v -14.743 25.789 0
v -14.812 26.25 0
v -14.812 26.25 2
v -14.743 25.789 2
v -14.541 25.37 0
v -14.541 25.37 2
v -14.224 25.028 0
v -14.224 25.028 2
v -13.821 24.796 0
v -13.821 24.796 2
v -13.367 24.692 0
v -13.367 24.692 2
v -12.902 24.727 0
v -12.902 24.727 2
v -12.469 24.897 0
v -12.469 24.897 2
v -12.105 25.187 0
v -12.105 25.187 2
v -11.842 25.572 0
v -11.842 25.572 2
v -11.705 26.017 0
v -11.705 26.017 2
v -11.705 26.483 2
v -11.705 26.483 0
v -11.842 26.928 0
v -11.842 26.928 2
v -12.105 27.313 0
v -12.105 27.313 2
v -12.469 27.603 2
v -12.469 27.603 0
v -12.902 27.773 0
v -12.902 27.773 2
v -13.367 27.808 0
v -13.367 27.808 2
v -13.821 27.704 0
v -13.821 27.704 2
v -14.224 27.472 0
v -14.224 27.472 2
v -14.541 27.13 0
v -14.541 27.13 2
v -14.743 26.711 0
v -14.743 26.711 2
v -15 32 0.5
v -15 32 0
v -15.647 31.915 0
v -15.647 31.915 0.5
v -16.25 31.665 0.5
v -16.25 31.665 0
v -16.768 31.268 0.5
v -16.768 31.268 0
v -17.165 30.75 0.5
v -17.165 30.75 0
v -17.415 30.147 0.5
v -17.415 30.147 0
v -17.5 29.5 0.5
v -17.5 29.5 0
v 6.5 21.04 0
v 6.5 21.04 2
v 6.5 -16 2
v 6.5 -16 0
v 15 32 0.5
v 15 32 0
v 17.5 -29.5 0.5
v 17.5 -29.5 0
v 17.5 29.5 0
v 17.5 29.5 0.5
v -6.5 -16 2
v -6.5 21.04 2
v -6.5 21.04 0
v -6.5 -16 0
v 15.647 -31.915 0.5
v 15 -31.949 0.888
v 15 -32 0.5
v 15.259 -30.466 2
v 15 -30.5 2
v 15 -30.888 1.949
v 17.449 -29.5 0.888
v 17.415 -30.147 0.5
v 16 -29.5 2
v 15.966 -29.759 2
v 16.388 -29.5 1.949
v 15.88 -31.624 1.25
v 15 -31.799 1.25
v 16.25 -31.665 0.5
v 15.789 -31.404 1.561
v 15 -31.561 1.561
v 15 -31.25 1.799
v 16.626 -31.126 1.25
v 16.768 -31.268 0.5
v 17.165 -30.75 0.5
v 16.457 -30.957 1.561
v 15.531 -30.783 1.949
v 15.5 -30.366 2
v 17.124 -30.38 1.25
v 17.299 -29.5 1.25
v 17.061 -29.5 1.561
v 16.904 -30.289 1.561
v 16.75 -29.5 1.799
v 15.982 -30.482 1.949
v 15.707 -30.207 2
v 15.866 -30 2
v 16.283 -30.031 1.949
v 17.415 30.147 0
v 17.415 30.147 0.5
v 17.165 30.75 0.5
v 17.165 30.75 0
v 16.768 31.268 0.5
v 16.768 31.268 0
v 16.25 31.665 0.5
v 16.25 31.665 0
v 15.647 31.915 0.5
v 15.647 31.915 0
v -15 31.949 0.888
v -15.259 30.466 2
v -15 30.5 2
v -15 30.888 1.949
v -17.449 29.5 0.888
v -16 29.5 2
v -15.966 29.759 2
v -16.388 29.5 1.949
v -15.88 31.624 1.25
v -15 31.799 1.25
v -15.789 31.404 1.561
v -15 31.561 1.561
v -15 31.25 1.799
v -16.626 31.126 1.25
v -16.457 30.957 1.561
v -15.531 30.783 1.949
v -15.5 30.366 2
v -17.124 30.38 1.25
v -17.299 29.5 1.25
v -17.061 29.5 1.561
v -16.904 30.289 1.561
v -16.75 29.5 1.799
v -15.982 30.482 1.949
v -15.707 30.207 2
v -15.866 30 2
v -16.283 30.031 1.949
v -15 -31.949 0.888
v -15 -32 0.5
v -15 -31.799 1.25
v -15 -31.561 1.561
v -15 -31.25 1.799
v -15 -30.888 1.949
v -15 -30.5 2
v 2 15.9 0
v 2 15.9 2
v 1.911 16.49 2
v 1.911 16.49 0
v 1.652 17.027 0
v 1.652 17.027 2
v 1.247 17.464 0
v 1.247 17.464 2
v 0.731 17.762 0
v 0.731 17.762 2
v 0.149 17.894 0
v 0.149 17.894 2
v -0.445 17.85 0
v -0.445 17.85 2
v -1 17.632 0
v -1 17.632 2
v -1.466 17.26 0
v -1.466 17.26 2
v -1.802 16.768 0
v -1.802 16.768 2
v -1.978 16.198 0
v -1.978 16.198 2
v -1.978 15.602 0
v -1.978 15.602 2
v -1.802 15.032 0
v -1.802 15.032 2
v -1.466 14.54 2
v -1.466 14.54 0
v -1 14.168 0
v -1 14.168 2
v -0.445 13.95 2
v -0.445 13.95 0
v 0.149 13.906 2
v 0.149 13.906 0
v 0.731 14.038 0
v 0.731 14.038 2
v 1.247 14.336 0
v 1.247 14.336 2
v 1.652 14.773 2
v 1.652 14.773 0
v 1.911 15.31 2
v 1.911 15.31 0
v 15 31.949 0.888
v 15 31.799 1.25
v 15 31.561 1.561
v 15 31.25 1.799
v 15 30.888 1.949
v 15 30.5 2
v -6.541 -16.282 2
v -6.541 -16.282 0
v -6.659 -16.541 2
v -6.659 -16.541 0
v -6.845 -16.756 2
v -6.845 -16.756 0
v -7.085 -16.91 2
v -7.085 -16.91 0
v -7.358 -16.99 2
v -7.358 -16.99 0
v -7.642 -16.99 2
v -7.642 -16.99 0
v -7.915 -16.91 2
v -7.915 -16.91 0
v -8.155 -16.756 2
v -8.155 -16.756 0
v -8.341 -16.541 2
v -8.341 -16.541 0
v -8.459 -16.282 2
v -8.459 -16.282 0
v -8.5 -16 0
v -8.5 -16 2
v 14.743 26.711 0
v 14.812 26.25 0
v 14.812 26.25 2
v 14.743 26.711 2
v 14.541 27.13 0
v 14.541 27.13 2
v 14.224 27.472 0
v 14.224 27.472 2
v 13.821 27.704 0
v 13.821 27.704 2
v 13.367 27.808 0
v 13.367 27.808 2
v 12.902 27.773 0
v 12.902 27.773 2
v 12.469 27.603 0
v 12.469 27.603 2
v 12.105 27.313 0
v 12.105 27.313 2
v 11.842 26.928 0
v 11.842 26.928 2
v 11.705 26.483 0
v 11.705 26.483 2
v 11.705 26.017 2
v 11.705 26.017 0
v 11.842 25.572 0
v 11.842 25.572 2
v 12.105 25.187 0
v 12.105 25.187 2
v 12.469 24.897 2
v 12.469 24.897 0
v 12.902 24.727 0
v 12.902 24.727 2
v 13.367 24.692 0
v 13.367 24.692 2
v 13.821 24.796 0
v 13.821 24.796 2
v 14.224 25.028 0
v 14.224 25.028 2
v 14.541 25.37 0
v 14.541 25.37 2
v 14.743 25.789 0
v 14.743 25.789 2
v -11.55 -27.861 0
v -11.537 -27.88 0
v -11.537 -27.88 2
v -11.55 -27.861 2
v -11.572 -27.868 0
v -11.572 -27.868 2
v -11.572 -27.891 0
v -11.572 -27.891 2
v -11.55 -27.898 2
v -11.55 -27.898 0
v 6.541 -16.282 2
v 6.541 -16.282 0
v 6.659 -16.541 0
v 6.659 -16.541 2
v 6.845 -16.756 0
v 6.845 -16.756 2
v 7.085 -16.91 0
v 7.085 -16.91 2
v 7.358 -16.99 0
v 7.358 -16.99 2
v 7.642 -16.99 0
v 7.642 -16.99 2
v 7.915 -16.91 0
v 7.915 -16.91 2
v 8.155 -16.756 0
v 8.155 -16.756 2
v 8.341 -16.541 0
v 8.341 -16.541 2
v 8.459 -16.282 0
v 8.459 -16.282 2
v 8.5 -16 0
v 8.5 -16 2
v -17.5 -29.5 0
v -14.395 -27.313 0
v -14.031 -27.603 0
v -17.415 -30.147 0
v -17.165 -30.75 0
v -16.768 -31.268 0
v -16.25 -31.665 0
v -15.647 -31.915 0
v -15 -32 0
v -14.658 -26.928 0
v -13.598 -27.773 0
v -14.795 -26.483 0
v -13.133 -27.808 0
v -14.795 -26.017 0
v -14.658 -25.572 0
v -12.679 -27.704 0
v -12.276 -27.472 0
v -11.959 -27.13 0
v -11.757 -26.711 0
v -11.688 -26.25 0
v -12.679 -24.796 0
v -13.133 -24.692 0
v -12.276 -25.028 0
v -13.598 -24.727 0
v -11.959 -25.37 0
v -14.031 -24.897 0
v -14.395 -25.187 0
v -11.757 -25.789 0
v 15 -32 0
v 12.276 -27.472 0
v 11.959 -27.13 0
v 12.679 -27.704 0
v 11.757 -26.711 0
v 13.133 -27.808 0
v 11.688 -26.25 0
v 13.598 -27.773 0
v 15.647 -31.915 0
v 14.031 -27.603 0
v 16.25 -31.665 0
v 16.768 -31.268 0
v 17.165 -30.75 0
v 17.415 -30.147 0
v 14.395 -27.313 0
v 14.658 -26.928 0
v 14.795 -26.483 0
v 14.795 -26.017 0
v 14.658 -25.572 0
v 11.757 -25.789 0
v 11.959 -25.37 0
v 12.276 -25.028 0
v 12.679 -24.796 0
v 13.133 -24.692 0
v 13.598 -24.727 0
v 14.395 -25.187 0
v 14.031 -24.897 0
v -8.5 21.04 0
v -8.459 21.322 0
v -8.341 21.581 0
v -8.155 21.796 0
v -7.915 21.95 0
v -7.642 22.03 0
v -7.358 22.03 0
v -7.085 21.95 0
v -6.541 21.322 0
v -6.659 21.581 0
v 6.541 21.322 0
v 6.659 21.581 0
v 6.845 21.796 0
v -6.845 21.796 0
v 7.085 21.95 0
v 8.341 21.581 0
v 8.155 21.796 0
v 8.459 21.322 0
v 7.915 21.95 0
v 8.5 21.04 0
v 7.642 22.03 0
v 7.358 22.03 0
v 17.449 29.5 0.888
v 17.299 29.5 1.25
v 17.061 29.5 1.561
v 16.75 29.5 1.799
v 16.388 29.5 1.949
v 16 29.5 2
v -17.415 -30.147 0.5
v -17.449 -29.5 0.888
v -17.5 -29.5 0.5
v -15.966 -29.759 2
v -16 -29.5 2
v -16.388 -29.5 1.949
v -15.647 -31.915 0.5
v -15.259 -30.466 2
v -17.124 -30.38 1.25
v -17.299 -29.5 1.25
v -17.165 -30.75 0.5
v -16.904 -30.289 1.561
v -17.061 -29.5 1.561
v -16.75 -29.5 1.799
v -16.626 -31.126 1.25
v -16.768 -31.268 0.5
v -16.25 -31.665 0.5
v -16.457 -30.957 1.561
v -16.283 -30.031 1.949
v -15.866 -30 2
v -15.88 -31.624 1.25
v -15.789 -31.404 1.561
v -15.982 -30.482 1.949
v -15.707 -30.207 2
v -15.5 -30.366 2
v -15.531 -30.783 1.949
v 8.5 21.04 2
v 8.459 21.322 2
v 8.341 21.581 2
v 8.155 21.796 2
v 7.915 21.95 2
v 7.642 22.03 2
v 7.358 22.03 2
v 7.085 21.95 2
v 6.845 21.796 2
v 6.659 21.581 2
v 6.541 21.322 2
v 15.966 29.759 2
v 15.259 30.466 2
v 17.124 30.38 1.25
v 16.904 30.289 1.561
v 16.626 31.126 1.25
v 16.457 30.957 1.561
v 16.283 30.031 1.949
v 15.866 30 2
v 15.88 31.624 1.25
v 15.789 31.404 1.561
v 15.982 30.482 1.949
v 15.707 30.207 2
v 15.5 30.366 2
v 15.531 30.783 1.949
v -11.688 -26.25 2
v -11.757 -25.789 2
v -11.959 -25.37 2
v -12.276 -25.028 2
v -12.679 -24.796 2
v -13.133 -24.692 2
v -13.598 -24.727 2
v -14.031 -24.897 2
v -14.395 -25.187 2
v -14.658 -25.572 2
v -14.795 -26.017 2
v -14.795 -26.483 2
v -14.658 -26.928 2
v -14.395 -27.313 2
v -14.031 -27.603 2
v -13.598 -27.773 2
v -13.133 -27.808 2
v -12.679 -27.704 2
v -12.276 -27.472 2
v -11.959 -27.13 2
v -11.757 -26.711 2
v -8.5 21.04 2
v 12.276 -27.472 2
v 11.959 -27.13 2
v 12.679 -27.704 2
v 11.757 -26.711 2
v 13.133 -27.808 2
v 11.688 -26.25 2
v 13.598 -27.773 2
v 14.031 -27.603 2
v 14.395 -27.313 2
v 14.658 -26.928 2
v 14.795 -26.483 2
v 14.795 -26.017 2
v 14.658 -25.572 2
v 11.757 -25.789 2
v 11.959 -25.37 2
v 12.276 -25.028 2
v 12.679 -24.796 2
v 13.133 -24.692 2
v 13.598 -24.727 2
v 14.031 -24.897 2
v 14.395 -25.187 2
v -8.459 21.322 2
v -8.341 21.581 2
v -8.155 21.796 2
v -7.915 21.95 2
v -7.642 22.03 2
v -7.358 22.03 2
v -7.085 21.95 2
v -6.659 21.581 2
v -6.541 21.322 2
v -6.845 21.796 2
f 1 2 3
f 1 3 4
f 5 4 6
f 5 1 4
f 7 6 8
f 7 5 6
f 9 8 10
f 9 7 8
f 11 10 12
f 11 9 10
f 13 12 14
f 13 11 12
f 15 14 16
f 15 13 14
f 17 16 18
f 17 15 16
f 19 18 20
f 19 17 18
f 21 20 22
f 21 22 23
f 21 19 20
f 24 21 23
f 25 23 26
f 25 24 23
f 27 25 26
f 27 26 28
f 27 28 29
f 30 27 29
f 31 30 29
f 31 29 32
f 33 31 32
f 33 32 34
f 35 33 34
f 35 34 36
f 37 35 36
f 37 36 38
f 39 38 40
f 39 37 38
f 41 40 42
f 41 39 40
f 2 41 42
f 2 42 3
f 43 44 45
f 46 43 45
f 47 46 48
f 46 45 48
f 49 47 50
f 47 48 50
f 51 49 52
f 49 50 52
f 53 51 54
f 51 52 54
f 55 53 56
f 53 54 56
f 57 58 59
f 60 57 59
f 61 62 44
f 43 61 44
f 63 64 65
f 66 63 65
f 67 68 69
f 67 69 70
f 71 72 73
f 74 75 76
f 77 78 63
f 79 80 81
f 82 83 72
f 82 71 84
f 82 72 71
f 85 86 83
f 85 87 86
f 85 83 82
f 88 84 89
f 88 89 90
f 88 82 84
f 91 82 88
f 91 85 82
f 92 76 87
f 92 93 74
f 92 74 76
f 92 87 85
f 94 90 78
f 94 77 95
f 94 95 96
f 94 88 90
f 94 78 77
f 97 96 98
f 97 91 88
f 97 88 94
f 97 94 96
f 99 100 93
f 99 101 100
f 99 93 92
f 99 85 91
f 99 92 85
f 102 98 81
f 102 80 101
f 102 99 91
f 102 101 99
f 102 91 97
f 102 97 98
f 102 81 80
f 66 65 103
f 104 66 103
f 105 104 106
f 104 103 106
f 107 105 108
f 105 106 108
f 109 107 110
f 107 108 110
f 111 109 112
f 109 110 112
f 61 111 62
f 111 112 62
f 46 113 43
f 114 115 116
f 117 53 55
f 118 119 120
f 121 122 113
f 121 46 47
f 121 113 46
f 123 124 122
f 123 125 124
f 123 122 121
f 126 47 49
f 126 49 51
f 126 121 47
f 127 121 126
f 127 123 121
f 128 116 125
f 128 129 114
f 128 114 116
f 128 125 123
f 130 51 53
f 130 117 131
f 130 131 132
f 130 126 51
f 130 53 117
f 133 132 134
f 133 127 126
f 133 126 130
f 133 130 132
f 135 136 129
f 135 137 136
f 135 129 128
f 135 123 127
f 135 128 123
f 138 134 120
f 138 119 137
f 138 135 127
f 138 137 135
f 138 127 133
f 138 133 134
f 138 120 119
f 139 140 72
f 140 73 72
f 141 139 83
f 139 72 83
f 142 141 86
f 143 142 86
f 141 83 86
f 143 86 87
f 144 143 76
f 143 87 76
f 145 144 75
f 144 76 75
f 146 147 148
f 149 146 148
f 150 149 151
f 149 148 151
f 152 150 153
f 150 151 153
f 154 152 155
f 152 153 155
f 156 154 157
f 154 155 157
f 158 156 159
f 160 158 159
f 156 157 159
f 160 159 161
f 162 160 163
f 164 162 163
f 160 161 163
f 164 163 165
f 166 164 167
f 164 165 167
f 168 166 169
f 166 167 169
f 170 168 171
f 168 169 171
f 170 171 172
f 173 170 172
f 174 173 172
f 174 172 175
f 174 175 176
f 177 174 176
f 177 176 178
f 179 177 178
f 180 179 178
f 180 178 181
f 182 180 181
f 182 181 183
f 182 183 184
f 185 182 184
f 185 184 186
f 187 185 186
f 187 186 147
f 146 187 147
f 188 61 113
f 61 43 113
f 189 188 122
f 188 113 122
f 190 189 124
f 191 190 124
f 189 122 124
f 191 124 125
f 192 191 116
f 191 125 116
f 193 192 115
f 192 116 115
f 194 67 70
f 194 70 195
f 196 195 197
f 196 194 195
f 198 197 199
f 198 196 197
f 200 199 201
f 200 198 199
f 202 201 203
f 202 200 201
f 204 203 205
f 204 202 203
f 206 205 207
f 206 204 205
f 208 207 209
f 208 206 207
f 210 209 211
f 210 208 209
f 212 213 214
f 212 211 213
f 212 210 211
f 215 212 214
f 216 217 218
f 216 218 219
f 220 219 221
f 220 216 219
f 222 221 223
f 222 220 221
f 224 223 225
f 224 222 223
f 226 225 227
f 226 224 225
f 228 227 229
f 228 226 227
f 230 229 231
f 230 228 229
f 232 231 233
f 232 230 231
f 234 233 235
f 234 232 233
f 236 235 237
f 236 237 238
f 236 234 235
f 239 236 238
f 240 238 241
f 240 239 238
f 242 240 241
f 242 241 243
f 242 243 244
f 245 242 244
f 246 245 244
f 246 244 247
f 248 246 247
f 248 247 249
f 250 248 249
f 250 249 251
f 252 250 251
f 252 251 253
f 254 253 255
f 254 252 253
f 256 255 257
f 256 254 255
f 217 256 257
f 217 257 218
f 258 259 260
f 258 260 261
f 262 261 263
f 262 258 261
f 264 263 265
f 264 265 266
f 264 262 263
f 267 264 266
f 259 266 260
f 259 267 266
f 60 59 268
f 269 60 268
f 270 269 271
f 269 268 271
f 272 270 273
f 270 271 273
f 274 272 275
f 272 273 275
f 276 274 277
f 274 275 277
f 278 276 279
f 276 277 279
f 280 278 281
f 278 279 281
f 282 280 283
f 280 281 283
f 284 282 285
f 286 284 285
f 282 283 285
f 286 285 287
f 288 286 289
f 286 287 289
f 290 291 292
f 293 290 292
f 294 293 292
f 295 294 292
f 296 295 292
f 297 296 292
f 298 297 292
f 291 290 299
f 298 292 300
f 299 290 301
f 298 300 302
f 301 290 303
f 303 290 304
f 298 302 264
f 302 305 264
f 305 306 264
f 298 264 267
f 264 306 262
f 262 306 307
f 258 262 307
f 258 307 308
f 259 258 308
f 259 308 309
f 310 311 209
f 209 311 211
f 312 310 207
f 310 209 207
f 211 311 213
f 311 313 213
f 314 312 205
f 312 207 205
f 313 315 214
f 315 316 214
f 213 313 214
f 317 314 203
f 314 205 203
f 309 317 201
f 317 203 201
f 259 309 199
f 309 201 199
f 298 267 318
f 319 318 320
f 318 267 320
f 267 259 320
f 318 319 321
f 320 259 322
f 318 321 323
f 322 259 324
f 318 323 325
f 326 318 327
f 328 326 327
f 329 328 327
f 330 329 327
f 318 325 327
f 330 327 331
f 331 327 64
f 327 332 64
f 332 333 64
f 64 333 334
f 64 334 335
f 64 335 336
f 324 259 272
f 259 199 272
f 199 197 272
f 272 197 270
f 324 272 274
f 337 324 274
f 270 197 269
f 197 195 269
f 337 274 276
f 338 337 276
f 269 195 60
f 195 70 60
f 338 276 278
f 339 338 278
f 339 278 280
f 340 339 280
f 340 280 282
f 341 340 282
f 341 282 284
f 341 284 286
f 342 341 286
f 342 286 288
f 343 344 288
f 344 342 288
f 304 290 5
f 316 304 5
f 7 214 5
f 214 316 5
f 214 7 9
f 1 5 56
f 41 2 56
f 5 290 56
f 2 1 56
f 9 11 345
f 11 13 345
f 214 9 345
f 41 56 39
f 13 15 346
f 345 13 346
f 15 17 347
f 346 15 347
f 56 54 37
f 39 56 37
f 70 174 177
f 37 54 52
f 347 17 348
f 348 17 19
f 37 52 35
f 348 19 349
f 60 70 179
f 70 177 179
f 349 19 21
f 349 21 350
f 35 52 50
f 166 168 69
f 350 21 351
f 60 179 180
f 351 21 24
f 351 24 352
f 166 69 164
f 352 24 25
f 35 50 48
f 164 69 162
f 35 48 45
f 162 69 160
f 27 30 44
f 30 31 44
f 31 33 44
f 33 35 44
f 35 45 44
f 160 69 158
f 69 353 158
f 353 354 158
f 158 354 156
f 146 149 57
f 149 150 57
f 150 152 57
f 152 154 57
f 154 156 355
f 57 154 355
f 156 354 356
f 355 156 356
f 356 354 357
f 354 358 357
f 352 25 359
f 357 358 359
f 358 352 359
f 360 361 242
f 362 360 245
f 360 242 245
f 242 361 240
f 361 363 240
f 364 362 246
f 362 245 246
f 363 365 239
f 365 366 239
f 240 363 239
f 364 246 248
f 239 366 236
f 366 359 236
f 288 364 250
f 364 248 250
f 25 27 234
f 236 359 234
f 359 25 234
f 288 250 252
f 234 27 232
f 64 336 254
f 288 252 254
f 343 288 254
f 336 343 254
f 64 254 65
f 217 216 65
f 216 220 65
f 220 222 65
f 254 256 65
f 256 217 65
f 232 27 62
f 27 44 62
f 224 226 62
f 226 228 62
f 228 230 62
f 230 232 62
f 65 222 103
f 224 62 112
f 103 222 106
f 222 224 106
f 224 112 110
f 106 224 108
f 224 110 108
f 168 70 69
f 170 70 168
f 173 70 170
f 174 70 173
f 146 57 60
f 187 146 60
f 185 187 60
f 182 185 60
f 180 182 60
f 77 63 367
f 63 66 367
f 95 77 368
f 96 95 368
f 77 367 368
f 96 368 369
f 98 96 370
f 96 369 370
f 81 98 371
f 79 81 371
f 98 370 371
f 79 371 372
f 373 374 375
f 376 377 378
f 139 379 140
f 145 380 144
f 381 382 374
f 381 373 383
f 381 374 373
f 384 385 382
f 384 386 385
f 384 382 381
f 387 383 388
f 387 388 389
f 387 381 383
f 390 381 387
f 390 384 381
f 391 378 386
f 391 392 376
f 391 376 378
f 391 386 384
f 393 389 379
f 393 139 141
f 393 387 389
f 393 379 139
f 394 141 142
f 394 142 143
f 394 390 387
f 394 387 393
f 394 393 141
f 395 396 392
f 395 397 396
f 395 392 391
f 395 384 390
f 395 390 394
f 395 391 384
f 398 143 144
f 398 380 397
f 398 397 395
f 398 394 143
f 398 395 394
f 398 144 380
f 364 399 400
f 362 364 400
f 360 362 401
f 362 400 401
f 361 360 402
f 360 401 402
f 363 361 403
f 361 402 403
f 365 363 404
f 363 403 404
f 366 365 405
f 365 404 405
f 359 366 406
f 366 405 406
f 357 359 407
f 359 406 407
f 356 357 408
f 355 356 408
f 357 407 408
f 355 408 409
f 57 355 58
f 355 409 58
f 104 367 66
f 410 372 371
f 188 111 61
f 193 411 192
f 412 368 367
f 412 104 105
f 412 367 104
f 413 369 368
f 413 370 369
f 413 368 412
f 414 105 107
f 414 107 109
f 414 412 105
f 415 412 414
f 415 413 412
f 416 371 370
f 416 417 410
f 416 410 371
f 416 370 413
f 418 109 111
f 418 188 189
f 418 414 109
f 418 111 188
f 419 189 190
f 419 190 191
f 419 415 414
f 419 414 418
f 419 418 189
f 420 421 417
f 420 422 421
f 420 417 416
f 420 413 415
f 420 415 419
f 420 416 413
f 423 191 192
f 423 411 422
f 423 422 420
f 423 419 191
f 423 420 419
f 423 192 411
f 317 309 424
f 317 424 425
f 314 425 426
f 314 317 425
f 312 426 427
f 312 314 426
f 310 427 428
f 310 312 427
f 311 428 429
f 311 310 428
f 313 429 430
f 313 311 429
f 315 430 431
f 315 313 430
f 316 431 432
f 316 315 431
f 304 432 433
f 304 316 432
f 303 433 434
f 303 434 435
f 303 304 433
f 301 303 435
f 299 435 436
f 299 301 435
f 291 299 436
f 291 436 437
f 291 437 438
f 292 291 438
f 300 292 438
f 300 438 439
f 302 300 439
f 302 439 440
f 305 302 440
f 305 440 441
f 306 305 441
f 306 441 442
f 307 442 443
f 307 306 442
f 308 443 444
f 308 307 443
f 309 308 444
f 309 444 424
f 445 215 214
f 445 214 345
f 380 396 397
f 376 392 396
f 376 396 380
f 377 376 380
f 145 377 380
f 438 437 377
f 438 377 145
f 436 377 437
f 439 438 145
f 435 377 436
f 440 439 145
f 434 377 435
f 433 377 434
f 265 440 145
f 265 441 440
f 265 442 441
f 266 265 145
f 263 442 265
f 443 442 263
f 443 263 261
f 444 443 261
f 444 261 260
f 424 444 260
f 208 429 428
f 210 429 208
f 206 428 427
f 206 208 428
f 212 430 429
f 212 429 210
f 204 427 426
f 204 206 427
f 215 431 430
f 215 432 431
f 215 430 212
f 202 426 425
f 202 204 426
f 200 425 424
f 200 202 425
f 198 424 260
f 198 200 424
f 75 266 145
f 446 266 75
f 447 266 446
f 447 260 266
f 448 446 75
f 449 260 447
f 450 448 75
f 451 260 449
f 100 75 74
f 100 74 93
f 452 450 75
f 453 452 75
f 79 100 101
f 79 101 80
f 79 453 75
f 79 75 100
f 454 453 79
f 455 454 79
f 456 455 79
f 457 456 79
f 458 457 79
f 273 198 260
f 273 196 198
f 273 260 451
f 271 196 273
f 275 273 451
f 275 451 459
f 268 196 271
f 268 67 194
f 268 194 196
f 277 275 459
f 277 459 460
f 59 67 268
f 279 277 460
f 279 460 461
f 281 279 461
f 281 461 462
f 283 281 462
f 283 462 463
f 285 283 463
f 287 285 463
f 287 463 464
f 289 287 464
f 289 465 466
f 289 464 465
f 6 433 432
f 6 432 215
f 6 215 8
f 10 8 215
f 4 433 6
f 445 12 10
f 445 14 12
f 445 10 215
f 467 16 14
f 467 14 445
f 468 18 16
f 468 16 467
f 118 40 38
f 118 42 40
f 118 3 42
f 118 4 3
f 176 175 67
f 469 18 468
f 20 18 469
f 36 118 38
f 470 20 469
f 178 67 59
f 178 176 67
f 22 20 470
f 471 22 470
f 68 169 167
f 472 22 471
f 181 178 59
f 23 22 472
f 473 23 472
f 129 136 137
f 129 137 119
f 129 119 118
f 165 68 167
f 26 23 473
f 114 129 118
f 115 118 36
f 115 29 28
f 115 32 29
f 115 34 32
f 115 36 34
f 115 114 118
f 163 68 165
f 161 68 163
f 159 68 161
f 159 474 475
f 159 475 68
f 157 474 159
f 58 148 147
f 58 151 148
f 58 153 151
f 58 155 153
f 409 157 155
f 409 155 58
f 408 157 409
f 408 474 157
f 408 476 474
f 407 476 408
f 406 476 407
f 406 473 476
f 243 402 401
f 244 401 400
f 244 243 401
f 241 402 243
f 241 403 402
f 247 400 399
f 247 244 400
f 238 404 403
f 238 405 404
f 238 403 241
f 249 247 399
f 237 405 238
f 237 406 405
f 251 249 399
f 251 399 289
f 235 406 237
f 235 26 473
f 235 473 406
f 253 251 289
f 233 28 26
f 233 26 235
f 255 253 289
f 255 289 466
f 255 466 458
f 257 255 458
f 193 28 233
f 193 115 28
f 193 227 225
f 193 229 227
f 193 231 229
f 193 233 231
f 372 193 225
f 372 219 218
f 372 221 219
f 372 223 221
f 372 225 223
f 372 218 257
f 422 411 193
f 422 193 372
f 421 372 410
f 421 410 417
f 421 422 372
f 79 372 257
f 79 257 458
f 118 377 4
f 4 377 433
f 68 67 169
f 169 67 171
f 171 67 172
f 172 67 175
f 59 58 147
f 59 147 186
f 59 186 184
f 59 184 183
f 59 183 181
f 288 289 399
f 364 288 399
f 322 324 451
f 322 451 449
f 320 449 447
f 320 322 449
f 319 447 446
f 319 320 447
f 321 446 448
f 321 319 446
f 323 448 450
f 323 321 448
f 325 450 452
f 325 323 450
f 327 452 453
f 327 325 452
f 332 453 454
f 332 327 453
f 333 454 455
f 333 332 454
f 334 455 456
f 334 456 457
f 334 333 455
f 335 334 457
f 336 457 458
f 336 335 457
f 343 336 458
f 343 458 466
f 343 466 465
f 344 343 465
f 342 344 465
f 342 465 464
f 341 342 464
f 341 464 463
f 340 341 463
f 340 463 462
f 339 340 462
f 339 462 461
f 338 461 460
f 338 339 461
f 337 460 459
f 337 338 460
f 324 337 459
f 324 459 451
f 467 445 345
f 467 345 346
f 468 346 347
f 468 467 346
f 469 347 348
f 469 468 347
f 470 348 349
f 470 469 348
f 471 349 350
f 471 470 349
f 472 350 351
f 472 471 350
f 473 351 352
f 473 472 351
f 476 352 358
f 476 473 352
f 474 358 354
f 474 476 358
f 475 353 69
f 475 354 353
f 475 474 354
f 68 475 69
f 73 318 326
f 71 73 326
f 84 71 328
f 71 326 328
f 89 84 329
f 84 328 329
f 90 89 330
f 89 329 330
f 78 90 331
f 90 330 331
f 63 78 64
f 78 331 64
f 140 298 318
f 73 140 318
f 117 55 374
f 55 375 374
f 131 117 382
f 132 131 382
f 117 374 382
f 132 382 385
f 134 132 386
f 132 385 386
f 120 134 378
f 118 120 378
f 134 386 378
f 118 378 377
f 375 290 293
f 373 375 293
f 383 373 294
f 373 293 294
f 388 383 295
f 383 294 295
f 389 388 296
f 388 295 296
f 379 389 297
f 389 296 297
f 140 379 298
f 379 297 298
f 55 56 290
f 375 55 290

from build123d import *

# Parameters (mm, degrees)
SKETCH1_R           = 0.019660033
SKETCH1_R_2         = 1.5625
BOSS_EXTRUDE1_DEPTH = 2
FILLET1_R           = 1.5
SKETCH3_R           = 2
CUT_EXTRUDE2_DEPTH  = 37.527386986
CUT_EXTRUDE3_DEPTH  = 37.527386986


with BuildPart() as part:
    # Sketch1 → Boss-Extrude1 (new body)
    with BuildSketch(Plane.XY):
        with BuildLine():
            Line((-15, -32), (15, -32))
            ThreePointArc((15, -32), (16.767766953, -31.267766953), (17.5, -29.5))
            Line((17.5, -29.5), (17.5, 29.5))
            ThreePointArc((17.5, 29.5), (16.767766953, 31.267766953), (15, 32))
            Line((15, 32), (-15, 32))
            ThreePointArc((-15, 32), (-16.767766953, 31.267766953), (-17.5, 29.5))
            Line((-17.5, 29.5), (-17.5, -29.5))
            ThreePointArc((-17.5, -29.5), (-16.767766953, -31.267766953), (-15, -32))
        make_face()
        with Locations((-11.556302767, -27.879566704)):
            Circle(SKETCH1_R, mode=Mode.SUBTRACT)
        with Locations((-13.25, -26.25)):
            Circle(SKETCH1_R_2, mode=Mode.SUBTRACT)
        with Locations(Location((-13.25, 26.25, 0), (0, 0, 180))):
            Circle(SKETCH1_R_2, mode=Mode.SUBTRACT)
        with Locations(Location((13.25, -26.25, 0), (0, 0, 180))):
            Circle(SKETCH1_R_2, mode=Mode.SUBTRACT)
        with Locations((13.25, 26.25)):
            Circle(SKETCH1_R_2, mode=Mode.SUBTRACT)
    extrude(amount=BOSS_EXTRUDE1_DEPTH)

    # Fillet1
    fillet1_edges = [part.edges().sort_by_distance(p)[0] for p in [
        (16.767766953, -31.267766953, 2),
        (17.5, 0, 2),
        (16.767766953, 31.267766953, 2),
        (0, 32, 2),
        (-16.767766953, 31.267766953, 2),
        (-17.5, 0, 2),
        (-16.767766953, -31.267766953, 2),
        (0, -32, 2),
    ]]
    fillet(fillet1_edges, radius=FILLET1_R)

    # Sketch3 → Cut-Extrude2 (cut, through all)
    with BuildSketch(Plane.XY.offset(2)):
        with Locations((0, 15.9)):
            Circle(SKETCH3_R)
    extrude(amount=-CUT_EXTRUDE2_DEPTH, mode=Mode.SUBTRACT)

    # Sketch2 → Cut-Extrude3 (cut, through all)
    with BuildSketch(Plane.XY.offset(2)):
        with BuildLine():
            Line((-8.5, -16), (-8.5, 21.04))
            ThreePointArc((-8.5, 21.04), (-7.5, 22.04), (-6.5, 21.04))
            Line((-6.5, 21.04), (-6.5, -16))
            ThreePointArc((-6.5, -16), (-7.5, -17), (-8.5, -16))
        make_face()
        with BuildLine():
            Line((8.5, -16), (8.5, 21.04))
            ThreePointArc((8.5, 21.04), (7.5, 22.04), (6.5, 21.04))
            Line((6.5, 21.04), (6.5, -16))
            ThreePointArc((6.5, -16), (7.5, -17), (8.5, -16))
        make_face()
    extrude(amount=-CUT_EXTRUDE3_DEPTH, mode=Mode.SUBTRACT)


solid = part.part
